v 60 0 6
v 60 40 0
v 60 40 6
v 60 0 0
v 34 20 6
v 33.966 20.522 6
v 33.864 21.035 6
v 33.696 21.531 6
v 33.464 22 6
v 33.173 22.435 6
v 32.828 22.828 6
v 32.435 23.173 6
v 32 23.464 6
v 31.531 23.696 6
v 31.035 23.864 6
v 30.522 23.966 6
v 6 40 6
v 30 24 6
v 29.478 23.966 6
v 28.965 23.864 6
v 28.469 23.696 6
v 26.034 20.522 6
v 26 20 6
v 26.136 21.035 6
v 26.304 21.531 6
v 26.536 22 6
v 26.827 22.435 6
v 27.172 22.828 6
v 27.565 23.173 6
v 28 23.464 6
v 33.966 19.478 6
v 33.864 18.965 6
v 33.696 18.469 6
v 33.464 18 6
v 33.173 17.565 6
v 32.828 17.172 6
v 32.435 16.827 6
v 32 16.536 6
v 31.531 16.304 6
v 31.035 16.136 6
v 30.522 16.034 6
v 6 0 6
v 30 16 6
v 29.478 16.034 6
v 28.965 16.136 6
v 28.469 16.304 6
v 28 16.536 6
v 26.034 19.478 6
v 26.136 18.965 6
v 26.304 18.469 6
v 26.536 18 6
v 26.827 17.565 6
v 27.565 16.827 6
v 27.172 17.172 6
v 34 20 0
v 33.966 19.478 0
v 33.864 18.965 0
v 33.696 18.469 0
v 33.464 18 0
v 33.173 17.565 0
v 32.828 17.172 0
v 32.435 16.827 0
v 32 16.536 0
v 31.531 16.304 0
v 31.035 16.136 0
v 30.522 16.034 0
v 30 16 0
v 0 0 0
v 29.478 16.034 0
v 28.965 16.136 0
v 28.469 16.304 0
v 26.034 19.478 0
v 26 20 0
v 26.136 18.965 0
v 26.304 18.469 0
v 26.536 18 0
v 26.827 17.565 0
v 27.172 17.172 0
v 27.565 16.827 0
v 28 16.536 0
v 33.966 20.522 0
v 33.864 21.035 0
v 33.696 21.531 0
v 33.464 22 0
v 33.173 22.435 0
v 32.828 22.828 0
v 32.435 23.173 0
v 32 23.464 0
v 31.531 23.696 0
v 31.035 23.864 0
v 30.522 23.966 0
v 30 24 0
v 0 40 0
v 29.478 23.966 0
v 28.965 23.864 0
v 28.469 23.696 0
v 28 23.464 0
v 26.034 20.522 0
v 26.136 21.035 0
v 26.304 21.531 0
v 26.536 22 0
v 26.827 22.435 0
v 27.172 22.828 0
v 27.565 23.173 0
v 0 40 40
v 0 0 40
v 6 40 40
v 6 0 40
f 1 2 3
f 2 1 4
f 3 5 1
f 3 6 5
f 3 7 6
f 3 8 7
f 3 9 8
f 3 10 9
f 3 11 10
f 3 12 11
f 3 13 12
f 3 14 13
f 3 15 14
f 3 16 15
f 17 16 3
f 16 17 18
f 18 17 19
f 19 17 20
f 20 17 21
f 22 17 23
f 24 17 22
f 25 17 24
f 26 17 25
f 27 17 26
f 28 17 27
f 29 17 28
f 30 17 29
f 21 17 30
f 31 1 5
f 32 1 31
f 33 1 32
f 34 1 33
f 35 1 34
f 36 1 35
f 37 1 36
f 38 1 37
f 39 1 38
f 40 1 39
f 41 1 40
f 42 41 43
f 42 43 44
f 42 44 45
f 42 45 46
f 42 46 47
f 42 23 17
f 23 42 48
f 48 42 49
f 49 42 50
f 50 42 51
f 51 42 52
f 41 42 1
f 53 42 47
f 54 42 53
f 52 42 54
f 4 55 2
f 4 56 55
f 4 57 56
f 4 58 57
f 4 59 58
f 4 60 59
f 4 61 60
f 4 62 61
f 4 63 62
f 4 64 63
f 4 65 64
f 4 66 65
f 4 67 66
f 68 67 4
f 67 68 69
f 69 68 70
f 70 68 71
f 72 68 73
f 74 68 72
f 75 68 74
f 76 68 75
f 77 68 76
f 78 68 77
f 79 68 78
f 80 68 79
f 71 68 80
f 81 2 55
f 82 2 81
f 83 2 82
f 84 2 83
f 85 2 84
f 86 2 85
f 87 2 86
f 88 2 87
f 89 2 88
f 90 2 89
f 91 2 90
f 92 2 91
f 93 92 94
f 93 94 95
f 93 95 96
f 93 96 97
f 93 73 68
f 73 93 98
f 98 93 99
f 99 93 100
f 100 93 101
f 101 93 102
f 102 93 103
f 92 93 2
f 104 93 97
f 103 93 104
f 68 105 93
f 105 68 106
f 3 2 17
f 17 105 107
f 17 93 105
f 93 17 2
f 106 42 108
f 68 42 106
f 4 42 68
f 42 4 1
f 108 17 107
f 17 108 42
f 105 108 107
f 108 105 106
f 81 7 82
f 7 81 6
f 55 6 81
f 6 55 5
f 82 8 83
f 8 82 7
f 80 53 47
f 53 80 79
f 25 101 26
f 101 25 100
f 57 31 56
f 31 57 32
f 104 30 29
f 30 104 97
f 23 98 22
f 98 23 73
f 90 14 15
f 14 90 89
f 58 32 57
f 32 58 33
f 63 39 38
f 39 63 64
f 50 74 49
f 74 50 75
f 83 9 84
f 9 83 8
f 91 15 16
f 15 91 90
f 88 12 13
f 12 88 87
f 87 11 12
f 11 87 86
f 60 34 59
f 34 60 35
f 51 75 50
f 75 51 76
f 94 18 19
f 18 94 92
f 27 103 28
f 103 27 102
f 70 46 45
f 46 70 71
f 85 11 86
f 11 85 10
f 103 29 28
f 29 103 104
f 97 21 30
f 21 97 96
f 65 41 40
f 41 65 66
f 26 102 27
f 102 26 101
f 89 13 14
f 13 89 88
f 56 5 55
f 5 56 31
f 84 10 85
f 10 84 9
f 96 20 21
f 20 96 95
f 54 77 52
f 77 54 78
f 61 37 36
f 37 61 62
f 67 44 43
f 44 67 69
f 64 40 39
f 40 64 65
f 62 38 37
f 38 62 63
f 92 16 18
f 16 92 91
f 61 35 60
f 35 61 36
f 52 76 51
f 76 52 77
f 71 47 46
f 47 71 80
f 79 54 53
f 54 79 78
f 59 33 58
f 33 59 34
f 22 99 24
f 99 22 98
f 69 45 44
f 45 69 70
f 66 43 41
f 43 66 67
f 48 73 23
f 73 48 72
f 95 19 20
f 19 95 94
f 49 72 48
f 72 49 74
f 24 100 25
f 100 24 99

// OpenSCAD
// Parametric L-bracket with a mounting hole.
//
// Every assignment below is an OpenSCAD Customizer parameter: the CAD
// viewer's Customizer panel lists them, the assistant's
// `list_scad_parameters` reads them from this text alone, and applying a
// value persists it to `bracket.scad-params.json` and replays it as a `-D`
// define on every later conversion. The source file itself is never written.

// Footprint of the base, in mm.
base_w = 60;      // [20:100]
base_d = 40;      // [10:80]
// Upright height and the wall thickness of both legs, in mm.
height = 40;      // [10:80]
thickness = 6;    // [2:12]
// Mounting-hole diameter in the base, in mm.
hole_d = 8;       // [3:20]

difference() {
    union() {
        cube([base_w, base_d, thickness]);
        translate([0, 0, 0]) cube([thickness, base_d, height]);
    }
    translate([base_w / 2, base_d / 2, -1])
        cylinder(h = thickness + 2, d = hole_d, $fn = 48);
}
